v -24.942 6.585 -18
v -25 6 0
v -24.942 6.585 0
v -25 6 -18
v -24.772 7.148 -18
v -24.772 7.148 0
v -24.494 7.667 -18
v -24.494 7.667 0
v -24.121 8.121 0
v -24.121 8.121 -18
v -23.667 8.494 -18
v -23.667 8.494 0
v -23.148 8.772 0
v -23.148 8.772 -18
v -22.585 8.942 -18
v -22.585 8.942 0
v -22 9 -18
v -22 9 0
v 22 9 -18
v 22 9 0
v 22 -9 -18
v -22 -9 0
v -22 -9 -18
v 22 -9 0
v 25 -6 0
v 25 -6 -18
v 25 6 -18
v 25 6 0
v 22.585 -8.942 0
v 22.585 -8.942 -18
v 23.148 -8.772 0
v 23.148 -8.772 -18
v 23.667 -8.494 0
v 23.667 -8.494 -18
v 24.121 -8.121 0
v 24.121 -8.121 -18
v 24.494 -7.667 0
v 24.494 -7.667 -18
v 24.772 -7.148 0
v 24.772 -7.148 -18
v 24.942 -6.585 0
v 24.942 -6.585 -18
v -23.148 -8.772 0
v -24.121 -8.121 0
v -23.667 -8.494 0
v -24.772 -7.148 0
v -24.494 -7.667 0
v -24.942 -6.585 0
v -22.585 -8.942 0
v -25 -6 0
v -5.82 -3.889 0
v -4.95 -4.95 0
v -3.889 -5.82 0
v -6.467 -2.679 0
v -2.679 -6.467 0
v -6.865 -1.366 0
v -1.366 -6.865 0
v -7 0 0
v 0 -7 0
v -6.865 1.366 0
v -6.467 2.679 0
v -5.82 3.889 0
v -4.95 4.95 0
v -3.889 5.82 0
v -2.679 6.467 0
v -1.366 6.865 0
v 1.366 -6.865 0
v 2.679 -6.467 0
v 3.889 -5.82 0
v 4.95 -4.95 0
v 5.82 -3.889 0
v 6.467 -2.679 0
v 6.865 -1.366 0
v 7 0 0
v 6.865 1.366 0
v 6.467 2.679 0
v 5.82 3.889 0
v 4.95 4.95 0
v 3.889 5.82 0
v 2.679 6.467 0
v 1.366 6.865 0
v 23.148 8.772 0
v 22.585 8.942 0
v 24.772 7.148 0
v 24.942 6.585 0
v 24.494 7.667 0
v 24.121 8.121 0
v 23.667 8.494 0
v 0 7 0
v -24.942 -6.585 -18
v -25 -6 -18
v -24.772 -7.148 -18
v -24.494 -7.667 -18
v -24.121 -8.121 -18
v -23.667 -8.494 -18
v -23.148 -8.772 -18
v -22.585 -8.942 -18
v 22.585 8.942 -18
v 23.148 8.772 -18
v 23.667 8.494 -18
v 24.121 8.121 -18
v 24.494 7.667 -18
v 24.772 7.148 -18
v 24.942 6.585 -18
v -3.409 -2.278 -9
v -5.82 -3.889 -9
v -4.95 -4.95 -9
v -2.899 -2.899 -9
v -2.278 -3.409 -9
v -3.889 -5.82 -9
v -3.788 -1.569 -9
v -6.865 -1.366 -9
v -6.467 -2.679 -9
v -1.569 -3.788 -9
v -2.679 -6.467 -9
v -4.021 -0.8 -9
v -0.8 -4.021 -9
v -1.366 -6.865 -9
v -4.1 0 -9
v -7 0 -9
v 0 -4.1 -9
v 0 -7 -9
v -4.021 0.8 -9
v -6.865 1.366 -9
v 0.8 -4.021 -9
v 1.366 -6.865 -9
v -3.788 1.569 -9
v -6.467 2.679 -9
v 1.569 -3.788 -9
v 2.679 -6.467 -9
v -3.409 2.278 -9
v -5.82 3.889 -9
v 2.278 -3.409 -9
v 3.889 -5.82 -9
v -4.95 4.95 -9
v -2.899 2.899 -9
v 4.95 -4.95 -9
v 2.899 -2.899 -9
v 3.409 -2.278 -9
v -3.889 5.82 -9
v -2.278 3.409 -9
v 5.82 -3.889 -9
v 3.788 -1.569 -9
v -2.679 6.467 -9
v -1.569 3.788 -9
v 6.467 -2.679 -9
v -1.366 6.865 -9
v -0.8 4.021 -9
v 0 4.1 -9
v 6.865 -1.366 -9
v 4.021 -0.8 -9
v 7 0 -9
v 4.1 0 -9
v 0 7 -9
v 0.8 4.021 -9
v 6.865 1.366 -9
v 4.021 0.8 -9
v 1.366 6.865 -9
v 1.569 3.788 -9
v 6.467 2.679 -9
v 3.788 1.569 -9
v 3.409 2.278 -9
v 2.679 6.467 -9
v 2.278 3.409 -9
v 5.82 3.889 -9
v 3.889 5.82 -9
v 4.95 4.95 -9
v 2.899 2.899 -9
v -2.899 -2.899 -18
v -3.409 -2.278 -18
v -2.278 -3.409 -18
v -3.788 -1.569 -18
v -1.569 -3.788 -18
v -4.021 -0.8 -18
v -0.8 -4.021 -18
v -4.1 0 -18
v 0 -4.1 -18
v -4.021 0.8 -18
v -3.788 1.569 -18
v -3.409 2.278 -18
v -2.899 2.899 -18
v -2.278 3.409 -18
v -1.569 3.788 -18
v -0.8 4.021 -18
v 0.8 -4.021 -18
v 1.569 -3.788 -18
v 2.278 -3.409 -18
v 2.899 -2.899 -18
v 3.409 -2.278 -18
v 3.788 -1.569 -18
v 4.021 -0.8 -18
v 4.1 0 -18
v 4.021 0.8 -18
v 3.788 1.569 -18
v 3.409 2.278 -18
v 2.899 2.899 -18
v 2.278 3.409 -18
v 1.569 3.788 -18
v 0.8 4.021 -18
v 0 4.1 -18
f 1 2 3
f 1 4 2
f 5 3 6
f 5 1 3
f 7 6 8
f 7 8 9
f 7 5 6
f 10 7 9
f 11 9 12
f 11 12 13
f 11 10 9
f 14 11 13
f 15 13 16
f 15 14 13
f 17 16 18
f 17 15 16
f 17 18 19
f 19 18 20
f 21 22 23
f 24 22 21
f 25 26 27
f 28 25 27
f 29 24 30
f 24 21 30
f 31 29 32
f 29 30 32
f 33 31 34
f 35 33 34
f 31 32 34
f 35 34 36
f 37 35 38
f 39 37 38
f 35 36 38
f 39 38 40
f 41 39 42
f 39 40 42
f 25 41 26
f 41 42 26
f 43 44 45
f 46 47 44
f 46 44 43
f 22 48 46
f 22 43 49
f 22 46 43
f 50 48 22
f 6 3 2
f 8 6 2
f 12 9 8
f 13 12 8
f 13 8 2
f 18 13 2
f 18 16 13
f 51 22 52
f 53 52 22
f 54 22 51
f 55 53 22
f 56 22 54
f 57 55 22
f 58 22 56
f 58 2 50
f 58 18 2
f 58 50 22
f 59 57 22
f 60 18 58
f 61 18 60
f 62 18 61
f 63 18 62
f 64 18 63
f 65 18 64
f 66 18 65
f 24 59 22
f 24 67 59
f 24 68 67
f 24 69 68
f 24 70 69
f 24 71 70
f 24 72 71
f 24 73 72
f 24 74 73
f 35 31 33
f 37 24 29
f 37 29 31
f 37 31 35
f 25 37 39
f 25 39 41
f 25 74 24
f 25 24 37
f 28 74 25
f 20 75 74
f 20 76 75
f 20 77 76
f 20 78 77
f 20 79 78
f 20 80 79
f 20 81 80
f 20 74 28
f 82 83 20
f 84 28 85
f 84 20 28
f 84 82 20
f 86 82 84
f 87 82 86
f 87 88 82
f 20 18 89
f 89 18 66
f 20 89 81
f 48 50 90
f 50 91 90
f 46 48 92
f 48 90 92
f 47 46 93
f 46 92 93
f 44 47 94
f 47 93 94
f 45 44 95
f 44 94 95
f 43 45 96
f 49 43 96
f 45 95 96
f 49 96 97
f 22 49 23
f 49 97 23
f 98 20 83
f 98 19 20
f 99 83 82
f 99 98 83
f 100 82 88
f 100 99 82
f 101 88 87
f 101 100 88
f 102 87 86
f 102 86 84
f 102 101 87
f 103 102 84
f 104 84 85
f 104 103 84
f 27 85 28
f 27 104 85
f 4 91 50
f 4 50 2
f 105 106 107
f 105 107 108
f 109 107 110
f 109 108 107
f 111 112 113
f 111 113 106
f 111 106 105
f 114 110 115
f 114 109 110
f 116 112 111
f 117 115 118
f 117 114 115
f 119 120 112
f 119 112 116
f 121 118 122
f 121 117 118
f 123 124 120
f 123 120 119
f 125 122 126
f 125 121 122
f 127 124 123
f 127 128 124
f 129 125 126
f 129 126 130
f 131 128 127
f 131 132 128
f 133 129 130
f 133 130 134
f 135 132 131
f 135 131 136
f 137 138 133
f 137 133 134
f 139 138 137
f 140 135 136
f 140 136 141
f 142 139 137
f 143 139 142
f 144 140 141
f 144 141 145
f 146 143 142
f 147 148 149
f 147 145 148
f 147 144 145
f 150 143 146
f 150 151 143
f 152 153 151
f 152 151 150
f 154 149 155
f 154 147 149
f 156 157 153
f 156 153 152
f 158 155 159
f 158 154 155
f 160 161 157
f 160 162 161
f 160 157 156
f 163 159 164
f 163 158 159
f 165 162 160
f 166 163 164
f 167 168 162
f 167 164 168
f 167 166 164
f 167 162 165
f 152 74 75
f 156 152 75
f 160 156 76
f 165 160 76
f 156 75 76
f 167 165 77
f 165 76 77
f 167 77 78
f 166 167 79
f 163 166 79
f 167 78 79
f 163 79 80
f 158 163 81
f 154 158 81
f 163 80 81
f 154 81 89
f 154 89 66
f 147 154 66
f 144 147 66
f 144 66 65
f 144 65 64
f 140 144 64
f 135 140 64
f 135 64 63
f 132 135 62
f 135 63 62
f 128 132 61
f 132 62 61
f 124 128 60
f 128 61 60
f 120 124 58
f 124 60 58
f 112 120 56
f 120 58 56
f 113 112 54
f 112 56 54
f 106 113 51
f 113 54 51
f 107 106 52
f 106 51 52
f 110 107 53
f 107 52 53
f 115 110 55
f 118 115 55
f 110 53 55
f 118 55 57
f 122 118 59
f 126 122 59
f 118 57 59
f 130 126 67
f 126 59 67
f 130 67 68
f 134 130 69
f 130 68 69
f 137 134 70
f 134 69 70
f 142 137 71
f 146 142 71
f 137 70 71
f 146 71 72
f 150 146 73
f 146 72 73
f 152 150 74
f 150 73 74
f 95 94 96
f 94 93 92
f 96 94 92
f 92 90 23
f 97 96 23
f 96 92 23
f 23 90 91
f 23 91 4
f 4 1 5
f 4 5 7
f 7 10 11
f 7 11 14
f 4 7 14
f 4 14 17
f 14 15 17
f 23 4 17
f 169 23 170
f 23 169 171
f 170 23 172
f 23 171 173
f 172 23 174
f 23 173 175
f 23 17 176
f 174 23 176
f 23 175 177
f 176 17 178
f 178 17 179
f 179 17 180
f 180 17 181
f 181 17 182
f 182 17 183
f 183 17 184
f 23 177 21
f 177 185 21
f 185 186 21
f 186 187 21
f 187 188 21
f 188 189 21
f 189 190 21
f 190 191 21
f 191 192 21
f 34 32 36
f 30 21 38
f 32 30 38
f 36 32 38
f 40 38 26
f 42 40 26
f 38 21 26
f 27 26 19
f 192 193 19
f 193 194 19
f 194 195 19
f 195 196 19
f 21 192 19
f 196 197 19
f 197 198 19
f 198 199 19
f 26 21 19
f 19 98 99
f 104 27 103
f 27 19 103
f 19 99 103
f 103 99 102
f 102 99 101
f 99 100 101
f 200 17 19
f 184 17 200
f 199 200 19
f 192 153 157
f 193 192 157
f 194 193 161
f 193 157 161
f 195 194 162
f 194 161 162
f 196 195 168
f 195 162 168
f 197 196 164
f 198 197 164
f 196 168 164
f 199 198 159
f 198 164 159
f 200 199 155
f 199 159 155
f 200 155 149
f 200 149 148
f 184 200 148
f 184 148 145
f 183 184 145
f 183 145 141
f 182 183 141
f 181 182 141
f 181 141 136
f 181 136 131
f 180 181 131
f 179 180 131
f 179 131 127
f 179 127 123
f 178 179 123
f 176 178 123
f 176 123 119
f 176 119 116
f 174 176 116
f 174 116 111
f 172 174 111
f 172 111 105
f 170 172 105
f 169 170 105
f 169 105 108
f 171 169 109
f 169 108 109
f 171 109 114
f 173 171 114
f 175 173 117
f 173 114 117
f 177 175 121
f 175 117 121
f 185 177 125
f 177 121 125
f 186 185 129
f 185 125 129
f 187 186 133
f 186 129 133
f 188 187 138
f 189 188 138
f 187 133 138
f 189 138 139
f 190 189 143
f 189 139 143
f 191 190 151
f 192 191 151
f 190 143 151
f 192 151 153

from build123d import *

# Parameters (mm, degrees)
SKETCH_W     = 50
SKETCH_H     = 18
SKETCH_R     = 4.1
PAD001_DEPTH = 18
FILLET_R     = 3
SKETCH003_R  = 7
POCKET_DEPTH = 9


with BuildPart() as part:
    # Sketch → Pad001 (new body)
    with BuildSketch(Plane.XY):
        Rectangle(SKETCH_W, SKETCH_H)
        Circle(SKETCH_R, mode=Mode.SUBTRACT)
    extrude(amount=-PAD001_DEPTH)

    # Fillet
    fillet_edges = [part.edges().sort_by_distance(p)[0] for p in [
        (25, -9, -9),
        (25, 9, -9),
        (-25, 9, -9),
        (-25, -9, -9),
    ]]
    fillet(fillet_edges, radius=FILLET_R)

    # Sketch003 (on Face2 of Fillet) → Pocket (cut)
    with BuildSketch(Plane.XY):
        Circle(SKETCH003_R)
    extrude(amount=-POCKET_DEPTH, mode=Mode.SUBTRACT)


solid = part.part
